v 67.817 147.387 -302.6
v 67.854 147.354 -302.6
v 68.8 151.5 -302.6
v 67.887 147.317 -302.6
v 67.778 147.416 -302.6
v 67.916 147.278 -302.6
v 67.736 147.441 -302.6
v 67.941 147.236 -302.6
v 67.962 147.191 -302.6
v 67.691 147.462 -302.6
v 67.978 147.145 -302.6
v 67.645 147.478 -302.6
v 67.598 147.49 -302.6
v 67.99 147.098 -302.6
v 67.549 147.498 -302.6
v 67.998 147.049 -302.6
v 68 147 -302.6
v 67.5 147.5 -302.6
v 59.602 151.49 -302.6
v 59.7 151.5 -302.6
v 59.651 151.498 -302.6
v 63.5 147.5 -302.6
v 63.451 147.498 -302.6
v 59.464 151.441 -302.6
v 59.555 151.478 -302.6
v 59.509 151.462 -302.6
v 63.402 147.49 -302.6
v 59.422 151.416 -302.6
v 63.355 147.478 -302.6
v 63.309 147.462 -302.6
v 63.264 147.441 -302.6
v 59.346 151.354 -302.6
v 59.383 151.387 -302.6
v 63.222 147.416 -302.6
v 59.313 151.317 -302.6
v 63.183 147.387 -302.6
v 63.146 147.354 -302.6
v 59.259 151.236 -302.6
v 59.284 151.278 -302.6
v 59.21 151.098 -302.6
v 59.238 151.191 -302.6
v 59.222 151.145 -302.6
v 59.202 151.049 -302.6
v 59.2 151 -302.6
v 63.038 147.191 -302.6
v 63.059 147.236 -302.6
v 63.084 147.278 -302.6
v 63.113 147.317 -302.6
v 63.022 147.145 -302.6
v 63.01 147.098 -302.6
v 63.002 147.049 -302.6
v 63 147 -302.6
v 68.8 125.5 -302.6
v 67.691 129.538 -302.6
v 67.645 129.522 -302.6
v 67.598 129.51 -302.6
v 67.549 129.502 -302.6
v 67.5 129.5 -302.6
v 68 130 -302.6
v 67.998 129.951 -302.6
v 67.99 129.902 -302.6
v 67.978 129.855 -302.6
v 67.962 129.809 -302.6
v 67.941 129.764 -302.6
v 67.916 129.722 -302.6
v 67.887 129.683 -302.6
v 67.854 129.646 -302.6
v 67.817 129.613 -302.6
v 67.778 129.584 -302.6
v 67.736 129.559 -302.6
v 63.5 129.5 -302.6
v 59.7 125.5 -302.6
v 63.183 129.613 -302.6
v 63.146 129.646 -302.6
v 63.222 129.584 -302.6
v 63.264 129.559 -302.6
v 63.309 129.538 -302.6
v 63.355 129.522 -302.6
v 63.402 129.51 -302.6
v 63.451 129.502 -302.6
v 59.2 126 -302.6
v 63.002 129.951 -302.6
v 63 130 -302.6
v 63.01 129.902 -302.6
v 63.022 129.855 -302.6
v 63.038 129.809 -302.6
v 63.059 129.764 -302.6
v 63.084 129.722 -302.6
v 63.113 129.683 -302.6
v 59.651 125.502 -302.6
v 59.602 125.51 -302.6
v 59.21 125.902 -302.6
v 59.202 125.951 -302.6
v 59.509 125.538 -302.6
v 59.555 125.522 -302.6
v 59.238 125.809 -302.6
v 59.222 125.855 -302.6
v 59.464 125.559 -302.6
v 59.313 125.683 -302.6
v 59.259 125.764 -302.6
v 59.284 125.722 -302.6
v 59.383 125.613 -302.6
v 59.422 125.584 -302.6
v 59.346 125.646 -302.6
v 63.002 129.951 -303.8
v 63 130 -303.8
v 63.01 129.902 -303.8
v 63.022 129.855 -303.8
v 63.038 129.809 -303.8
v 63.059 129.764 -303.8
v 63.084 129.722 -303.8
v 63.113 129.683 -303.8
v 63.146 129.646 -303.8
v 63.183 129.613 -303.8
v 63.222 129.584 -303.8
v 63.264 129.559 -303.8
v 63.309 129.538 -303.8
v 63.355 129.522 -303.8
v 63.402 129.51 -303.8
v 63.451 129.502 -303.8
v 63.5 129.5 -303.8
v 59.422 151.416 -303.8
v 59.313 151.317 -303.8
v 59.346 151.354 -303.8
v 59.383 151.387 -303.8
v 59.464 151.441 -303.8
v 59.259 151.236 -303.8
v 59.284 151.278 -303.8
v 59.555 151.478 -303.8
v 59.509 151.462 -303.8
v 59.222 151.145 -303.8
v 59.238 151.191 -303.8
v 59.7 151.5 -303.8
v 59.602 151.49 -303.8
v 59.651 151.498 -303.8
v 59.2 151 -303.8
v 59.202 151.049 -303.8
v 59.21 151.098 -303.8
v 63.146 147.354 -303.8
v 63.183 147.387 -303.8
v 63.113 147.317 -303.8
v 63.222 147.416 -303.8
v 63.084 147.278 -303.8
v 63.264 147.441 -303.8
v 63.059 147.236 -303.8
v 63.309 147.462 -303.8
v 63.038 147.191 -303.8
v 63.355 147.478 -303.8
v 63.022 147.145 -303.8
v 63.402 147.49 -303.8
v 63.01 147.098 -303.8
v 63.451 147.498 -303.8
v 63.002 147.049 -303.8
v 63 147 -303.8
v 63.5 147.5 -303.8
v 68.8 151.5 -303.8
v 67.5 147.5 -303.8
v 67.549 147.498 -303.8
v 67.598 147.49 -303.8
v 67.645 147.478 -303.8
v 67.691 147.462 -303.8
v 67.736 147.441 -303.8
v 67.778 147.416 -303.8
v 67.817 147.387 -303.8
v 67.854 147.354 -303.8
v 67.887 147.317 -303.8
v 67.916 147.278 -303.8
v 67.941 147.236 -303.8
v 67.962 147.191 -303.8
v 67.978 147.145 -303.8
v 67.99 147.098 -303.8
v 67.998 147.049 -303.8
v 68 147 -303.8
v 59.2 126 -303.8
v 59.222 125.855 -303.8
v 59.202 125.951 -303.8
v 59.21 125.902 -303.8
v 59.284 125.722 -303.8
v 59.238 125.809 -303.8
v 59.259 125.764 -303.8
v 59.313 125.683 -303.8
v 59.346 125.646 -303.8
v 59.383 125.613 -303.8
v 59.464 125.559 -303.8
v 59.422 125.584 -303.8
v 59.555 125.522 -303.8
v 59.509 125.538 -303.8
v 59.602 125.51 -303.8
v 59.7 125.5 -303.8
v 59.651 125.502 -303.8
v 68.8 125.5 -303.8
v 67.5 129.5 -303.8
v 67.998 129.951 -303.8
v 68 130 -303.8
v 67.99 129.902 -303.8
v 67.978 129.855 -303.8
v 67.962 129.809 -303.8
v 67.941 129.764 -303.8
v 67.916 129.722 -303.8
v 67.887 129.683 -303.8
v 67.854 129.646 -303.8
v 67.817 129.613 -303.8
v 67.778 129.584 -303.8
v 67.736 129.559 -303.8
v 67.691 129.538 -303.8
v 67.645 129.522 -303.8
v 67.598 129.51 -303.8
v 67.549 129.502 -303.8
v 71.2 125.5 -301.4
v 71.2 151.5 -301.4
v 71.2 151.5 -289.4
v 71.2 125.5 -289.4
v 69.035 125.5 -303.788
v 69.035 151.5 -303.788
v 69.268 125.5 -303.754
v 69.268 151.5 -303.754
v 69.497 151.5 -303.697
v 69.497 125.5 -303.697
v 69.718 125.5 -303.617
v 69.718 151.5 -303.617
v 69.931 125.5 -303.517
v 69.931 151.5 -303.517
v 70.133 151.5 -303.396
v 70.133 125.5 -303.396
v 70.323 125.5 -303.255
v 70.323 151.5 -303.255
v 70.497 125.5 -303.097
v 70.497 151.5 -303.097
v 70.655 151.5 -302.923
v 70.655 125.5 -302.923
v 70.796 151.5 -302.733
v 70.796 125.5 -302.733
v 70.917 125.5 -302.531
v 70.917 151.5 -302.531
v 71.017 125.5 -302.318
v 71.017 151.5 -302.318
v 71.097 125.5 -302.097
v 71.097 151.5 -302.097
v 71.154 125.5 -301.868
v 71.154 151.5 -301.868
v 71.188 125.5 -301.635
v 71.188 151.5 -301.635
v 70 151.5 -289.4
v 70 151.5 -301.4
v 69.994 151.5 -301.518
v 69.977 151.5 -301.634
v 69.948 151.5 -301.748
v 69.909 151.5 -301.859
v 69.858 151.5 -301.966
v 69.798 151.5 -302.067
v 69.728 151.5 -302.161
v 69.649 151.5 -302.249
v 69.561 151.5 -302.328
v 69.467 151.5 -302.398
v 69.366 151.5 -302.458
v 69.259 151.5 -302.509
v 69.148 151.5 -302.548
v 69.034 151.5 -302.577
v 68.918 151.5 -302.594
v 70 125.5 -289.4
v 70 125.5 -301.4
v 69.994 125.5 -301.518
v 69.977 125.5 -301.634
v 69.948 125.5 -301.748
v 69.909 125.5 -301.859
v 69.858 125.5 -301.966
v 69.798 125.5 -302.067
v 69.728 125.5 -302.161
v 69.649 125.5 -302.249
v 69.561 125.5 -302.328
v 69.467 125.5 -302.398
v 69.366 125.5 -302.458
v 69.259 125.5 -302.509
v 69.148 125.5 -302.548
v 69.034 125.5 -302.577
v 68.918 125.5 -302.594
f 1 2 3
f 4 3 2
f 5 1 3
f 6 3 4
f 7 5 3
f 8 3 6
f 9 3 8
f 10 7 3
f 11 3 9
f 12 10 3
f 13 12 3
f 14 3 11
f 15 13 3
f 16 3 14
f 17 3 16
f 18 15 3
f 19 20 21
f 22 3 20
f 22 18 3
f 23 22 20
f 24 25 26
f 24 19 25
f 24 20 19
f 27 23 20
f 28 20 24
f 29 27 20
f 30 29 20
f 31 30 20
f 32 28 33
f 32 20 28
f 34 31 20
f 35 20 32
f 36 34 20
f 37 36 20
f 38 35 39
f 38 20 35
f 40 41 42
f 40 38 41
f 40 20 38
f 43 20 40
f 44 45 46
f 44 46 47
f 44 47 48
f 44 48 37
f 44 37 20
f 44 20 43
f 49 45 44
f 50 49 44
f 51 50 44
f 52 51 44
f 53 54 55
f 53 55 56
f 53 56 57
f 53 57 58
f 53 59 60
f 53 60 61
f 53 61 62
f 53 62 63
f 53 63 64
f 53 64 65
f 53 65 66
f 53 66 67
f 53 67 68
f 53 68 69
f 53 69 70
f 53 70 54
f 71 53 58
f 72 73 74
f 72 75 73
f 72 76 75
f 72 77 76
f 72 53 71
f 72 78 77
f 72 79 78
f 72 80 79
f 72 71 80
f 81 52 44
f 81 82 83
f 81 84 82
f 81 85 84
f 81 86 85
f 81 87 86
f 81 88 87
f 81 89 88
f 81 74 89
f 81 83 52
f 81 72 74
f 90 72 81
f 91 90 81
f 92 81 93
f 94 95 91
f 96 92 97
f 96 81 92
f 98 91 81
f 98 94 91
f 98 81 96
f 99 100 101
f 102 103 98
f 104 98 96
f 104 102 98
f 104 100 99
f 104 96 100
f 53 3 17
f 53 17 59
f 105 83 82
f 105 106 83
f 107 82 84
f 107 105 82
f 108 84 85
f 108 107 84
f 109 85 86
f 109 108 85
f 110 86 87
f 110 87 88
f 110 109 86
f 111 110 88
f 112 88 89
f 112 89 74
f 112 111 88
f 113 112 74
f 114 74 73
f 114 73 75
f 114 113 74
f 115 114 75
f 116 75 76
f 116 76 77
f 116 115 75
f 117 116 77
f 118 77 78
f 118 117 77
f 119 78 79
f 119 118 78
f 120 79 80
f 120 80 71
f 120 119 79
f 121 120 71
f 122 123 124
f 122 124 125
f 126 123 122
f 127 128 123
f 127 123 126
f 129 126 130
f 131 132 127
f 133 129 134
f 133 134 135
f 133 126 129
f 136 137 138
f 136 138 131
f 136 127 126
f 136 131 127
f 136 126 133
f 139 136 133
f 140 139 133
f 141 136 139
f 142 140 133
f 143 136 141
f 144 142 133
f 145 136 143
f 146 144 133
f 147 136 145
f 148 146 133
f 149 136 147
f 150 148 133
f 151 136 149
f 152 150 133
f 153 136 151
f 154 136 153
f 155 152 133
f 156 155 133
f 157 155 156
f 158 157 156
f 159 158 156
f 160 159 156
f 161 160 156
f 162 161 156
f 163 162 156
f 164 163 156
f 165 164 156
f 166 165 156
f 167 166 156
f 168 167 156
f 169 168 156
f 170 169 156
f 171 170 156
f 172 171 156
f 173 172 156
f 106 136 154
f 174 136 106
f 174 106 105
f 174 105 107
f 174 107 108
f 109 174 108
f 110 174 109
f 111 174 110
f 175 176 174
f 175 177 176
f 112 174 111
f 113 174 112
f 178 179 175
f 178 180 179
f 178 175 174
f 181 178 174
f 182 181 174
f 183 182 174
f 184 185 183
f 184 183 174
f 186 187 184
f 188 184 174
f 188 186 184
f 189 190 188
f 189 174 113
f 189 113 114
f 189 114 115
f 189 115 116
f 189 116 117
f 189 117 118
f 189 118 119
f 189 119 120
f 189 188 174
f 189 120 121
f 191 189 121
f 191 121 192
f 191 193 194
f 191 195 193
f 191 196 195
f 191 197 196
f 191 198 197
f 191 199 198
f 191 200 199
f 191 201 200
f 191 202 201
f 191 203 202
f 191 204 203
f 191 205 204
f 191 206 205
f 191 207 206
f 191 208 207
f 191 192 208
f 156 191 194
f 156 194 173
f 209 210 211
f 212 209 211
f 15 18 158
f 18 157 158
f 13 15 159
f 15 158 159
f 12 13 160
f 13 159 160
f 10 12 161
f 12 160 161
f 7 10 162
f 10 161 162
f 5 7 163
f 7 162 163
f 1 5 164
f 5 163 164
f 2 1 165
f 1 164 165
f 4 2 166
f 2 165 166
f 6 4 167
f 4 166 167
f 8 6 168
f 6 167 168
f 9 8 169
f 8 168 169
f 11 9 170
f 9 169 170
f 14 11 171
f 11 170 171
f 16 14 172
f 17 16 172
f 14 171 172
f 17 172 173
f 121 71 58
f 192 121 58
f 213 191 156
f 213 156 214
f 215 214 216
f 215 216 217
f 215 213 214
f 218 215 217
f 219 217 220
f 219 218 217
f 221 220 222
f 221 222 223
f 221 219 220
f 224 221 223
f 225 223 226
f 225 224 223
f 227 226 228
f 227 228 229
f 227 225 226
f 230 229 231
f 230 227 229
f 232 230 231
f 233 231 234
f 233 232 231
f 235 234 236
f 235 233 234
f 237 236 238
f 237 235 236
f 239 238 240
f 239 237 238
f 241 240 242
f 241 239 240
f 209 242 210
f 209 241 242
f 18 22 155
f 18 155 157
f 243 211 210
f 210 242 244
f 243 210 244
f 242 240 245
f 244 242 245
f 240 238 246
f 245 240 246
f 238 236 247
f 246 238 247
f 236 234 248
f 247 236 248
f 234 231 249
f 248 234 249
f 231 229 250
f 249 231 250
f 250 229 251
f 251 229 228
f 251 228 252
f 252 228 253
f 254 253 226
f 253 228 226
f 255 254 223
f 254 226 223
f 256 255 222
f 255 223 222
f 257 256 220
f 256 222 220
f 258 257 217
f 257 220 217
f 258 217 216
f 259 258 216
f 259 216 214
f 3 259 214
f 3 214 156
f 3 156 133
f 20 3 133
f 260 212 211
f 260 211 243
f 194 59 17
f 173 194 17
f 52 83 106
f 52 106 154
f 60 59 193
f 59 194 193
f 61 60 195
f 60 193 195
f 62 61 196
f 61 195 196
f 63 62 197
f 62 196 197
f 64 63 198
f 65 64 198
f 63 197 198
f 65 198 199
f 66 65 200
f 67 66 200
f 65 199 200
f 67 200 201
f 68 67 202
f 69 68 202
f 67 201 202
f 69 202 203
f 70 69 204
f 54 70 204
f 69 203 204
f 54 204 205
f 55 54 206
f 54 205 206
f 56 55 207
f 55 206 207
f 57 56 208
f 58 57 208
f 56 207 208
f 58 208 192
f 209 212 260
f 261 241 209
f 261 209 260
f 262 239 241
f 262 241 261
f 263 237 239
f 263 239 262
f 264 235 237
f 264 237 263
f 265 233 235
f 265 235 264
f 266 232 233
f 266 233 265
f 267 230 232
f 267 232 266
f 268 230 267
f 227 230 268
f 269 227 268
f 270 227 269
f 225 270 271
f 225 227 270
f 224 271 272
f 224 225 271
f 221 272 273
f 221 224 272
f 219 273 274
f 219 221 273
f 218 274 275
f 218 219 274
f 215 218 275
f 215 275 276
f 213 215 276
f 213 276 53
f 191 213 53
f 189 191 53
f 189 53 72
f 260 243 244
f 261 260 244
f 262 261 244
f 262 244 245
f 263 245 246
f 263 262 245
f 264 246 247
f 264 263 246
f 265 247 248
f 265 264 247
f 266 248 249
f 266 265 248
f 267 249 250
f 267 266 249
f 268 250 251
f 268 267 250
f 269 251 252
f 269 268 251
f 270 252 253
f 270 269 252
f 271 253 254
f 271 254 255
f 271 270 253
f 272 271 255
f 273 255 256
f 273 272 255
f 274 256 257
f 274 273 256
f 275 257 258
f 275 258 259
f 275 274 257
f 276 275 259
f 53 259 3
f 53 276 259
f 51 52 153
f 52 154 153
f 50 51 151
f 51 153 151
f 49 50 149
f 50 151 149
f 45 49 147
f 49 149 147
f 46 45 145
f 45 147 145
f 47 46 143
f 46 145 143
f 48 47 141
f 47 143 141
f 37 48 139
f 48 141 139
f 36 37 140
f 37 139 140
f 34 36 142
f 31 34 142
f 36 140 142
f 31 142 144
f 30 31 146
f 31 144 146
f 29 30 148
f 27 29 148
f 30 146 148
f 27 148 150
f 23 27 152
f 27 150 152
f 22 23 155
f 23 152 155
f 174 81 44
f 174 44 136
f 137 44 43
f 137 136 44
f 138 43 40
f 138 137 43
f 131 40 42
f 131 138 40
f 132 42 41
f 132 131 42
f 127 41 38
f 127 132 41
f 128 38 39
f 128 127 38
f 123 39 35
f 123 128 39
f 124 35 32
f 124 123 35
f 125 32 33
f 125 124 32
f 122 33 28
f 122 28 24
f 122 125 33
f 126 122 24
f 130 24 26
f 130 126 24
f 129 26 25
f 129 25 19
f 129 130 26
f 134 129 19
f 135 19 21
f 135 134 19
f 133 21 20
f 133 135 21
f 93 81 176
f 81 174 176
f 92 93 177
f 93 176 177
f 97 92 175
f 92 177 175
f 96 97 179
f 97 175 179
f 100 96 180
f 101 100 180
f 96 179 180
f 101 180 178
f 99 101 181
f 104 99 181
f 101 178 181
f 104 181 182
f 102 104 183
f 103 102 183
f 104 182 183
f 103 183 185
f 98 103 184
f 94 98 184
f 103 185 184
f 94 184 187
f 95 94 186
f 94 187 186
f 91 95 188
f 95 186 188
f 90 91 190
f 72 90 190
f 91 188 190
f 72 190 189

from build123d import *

# Parameters (mm, degrees)
EXTRUDE_26_DEPTH       = 26
SKETCH_18_5_Y138_5_W   = 5
SKETCH_18_5_Y138_5_H   = 18
CUT_EXTRUDE_18_5_DEPTH = 1.2
FILLET_R0_5_R          = 0.5
FILLET_R0_5_2_R        = 0.5


with BuildPart() as part:
    # 草图_L形卡耳_内伸12_厚1点2_内R1点2_焊脚12 → 拉伸_卡耳外高26 (new body)
    with BuildSketch(Plane(origin=(0, 125.5, 0), x_dir=(1, 0, 0), z_dir=(0, 1, 0))):
        with BuildLine():
            Line((59.2, 303.8), (68.8, 303.8))
            ThreePointArc((68.8, 303.8), (70.497056275, 303.097056275), (71.2, 301.4))
            Line((71.2, 301.4), (71.2, 289.4))
            Line((71.2, 289.4), (70, 289.4))
            Line((70, 289.4), (70, 301.4))
            ThreePointArc((70, 301.4), (69.648528137, 302.248528137), (68.8, 302.6))
            Line((68.8, 302.6), (59.2, 302.6))
            Line((59.2, 302.6), (59.2, 303.8))
        make_face()
    extrude(amount=EXTRUDE_26_DEPTH)

    # 草图_卡槽矩形_净高18_净宽5_中心Y138点5 → 切除_卡槽18乘5 (cut)
    with BuildSketch(Plane.XY.offset(-302.6)):
        with Locations((65.5, 138.5)):
            Rectangle(SKETCH_18_5_Y138_5_W, SKETCH_18_5_Y138_5_H)
    extrude(amount=-CUT_EXTRUDE_18_5_DEPTH, mode=Mode.SUBTRACT)

    # Fillet R0_5
    fillet_r0_5_edges = [part.edges().sort_by_distance(p)[0] for p in [
        (68, 147.5, -303.2),
        (68, 129.5, -303.2),
        (63, 129.5, -303.2),
        (63, 147.5, -303.2),
    ]]
    fillet(fillet_r0_5_edges, radius=FILLET_R0_5_R)

    # Fillet R0_5 2
    fillet_r0_5_2_edges = [part.edges().sort_by_distance(p)[0] for p in [
        (59.2, 125.5, -303.2),
        (59.2, 151.5, -303.2),
    ]]
    fillet(fillet_r0_5_2_edges, radius=FILLET_R0_5_2_R)


solid = part.part
